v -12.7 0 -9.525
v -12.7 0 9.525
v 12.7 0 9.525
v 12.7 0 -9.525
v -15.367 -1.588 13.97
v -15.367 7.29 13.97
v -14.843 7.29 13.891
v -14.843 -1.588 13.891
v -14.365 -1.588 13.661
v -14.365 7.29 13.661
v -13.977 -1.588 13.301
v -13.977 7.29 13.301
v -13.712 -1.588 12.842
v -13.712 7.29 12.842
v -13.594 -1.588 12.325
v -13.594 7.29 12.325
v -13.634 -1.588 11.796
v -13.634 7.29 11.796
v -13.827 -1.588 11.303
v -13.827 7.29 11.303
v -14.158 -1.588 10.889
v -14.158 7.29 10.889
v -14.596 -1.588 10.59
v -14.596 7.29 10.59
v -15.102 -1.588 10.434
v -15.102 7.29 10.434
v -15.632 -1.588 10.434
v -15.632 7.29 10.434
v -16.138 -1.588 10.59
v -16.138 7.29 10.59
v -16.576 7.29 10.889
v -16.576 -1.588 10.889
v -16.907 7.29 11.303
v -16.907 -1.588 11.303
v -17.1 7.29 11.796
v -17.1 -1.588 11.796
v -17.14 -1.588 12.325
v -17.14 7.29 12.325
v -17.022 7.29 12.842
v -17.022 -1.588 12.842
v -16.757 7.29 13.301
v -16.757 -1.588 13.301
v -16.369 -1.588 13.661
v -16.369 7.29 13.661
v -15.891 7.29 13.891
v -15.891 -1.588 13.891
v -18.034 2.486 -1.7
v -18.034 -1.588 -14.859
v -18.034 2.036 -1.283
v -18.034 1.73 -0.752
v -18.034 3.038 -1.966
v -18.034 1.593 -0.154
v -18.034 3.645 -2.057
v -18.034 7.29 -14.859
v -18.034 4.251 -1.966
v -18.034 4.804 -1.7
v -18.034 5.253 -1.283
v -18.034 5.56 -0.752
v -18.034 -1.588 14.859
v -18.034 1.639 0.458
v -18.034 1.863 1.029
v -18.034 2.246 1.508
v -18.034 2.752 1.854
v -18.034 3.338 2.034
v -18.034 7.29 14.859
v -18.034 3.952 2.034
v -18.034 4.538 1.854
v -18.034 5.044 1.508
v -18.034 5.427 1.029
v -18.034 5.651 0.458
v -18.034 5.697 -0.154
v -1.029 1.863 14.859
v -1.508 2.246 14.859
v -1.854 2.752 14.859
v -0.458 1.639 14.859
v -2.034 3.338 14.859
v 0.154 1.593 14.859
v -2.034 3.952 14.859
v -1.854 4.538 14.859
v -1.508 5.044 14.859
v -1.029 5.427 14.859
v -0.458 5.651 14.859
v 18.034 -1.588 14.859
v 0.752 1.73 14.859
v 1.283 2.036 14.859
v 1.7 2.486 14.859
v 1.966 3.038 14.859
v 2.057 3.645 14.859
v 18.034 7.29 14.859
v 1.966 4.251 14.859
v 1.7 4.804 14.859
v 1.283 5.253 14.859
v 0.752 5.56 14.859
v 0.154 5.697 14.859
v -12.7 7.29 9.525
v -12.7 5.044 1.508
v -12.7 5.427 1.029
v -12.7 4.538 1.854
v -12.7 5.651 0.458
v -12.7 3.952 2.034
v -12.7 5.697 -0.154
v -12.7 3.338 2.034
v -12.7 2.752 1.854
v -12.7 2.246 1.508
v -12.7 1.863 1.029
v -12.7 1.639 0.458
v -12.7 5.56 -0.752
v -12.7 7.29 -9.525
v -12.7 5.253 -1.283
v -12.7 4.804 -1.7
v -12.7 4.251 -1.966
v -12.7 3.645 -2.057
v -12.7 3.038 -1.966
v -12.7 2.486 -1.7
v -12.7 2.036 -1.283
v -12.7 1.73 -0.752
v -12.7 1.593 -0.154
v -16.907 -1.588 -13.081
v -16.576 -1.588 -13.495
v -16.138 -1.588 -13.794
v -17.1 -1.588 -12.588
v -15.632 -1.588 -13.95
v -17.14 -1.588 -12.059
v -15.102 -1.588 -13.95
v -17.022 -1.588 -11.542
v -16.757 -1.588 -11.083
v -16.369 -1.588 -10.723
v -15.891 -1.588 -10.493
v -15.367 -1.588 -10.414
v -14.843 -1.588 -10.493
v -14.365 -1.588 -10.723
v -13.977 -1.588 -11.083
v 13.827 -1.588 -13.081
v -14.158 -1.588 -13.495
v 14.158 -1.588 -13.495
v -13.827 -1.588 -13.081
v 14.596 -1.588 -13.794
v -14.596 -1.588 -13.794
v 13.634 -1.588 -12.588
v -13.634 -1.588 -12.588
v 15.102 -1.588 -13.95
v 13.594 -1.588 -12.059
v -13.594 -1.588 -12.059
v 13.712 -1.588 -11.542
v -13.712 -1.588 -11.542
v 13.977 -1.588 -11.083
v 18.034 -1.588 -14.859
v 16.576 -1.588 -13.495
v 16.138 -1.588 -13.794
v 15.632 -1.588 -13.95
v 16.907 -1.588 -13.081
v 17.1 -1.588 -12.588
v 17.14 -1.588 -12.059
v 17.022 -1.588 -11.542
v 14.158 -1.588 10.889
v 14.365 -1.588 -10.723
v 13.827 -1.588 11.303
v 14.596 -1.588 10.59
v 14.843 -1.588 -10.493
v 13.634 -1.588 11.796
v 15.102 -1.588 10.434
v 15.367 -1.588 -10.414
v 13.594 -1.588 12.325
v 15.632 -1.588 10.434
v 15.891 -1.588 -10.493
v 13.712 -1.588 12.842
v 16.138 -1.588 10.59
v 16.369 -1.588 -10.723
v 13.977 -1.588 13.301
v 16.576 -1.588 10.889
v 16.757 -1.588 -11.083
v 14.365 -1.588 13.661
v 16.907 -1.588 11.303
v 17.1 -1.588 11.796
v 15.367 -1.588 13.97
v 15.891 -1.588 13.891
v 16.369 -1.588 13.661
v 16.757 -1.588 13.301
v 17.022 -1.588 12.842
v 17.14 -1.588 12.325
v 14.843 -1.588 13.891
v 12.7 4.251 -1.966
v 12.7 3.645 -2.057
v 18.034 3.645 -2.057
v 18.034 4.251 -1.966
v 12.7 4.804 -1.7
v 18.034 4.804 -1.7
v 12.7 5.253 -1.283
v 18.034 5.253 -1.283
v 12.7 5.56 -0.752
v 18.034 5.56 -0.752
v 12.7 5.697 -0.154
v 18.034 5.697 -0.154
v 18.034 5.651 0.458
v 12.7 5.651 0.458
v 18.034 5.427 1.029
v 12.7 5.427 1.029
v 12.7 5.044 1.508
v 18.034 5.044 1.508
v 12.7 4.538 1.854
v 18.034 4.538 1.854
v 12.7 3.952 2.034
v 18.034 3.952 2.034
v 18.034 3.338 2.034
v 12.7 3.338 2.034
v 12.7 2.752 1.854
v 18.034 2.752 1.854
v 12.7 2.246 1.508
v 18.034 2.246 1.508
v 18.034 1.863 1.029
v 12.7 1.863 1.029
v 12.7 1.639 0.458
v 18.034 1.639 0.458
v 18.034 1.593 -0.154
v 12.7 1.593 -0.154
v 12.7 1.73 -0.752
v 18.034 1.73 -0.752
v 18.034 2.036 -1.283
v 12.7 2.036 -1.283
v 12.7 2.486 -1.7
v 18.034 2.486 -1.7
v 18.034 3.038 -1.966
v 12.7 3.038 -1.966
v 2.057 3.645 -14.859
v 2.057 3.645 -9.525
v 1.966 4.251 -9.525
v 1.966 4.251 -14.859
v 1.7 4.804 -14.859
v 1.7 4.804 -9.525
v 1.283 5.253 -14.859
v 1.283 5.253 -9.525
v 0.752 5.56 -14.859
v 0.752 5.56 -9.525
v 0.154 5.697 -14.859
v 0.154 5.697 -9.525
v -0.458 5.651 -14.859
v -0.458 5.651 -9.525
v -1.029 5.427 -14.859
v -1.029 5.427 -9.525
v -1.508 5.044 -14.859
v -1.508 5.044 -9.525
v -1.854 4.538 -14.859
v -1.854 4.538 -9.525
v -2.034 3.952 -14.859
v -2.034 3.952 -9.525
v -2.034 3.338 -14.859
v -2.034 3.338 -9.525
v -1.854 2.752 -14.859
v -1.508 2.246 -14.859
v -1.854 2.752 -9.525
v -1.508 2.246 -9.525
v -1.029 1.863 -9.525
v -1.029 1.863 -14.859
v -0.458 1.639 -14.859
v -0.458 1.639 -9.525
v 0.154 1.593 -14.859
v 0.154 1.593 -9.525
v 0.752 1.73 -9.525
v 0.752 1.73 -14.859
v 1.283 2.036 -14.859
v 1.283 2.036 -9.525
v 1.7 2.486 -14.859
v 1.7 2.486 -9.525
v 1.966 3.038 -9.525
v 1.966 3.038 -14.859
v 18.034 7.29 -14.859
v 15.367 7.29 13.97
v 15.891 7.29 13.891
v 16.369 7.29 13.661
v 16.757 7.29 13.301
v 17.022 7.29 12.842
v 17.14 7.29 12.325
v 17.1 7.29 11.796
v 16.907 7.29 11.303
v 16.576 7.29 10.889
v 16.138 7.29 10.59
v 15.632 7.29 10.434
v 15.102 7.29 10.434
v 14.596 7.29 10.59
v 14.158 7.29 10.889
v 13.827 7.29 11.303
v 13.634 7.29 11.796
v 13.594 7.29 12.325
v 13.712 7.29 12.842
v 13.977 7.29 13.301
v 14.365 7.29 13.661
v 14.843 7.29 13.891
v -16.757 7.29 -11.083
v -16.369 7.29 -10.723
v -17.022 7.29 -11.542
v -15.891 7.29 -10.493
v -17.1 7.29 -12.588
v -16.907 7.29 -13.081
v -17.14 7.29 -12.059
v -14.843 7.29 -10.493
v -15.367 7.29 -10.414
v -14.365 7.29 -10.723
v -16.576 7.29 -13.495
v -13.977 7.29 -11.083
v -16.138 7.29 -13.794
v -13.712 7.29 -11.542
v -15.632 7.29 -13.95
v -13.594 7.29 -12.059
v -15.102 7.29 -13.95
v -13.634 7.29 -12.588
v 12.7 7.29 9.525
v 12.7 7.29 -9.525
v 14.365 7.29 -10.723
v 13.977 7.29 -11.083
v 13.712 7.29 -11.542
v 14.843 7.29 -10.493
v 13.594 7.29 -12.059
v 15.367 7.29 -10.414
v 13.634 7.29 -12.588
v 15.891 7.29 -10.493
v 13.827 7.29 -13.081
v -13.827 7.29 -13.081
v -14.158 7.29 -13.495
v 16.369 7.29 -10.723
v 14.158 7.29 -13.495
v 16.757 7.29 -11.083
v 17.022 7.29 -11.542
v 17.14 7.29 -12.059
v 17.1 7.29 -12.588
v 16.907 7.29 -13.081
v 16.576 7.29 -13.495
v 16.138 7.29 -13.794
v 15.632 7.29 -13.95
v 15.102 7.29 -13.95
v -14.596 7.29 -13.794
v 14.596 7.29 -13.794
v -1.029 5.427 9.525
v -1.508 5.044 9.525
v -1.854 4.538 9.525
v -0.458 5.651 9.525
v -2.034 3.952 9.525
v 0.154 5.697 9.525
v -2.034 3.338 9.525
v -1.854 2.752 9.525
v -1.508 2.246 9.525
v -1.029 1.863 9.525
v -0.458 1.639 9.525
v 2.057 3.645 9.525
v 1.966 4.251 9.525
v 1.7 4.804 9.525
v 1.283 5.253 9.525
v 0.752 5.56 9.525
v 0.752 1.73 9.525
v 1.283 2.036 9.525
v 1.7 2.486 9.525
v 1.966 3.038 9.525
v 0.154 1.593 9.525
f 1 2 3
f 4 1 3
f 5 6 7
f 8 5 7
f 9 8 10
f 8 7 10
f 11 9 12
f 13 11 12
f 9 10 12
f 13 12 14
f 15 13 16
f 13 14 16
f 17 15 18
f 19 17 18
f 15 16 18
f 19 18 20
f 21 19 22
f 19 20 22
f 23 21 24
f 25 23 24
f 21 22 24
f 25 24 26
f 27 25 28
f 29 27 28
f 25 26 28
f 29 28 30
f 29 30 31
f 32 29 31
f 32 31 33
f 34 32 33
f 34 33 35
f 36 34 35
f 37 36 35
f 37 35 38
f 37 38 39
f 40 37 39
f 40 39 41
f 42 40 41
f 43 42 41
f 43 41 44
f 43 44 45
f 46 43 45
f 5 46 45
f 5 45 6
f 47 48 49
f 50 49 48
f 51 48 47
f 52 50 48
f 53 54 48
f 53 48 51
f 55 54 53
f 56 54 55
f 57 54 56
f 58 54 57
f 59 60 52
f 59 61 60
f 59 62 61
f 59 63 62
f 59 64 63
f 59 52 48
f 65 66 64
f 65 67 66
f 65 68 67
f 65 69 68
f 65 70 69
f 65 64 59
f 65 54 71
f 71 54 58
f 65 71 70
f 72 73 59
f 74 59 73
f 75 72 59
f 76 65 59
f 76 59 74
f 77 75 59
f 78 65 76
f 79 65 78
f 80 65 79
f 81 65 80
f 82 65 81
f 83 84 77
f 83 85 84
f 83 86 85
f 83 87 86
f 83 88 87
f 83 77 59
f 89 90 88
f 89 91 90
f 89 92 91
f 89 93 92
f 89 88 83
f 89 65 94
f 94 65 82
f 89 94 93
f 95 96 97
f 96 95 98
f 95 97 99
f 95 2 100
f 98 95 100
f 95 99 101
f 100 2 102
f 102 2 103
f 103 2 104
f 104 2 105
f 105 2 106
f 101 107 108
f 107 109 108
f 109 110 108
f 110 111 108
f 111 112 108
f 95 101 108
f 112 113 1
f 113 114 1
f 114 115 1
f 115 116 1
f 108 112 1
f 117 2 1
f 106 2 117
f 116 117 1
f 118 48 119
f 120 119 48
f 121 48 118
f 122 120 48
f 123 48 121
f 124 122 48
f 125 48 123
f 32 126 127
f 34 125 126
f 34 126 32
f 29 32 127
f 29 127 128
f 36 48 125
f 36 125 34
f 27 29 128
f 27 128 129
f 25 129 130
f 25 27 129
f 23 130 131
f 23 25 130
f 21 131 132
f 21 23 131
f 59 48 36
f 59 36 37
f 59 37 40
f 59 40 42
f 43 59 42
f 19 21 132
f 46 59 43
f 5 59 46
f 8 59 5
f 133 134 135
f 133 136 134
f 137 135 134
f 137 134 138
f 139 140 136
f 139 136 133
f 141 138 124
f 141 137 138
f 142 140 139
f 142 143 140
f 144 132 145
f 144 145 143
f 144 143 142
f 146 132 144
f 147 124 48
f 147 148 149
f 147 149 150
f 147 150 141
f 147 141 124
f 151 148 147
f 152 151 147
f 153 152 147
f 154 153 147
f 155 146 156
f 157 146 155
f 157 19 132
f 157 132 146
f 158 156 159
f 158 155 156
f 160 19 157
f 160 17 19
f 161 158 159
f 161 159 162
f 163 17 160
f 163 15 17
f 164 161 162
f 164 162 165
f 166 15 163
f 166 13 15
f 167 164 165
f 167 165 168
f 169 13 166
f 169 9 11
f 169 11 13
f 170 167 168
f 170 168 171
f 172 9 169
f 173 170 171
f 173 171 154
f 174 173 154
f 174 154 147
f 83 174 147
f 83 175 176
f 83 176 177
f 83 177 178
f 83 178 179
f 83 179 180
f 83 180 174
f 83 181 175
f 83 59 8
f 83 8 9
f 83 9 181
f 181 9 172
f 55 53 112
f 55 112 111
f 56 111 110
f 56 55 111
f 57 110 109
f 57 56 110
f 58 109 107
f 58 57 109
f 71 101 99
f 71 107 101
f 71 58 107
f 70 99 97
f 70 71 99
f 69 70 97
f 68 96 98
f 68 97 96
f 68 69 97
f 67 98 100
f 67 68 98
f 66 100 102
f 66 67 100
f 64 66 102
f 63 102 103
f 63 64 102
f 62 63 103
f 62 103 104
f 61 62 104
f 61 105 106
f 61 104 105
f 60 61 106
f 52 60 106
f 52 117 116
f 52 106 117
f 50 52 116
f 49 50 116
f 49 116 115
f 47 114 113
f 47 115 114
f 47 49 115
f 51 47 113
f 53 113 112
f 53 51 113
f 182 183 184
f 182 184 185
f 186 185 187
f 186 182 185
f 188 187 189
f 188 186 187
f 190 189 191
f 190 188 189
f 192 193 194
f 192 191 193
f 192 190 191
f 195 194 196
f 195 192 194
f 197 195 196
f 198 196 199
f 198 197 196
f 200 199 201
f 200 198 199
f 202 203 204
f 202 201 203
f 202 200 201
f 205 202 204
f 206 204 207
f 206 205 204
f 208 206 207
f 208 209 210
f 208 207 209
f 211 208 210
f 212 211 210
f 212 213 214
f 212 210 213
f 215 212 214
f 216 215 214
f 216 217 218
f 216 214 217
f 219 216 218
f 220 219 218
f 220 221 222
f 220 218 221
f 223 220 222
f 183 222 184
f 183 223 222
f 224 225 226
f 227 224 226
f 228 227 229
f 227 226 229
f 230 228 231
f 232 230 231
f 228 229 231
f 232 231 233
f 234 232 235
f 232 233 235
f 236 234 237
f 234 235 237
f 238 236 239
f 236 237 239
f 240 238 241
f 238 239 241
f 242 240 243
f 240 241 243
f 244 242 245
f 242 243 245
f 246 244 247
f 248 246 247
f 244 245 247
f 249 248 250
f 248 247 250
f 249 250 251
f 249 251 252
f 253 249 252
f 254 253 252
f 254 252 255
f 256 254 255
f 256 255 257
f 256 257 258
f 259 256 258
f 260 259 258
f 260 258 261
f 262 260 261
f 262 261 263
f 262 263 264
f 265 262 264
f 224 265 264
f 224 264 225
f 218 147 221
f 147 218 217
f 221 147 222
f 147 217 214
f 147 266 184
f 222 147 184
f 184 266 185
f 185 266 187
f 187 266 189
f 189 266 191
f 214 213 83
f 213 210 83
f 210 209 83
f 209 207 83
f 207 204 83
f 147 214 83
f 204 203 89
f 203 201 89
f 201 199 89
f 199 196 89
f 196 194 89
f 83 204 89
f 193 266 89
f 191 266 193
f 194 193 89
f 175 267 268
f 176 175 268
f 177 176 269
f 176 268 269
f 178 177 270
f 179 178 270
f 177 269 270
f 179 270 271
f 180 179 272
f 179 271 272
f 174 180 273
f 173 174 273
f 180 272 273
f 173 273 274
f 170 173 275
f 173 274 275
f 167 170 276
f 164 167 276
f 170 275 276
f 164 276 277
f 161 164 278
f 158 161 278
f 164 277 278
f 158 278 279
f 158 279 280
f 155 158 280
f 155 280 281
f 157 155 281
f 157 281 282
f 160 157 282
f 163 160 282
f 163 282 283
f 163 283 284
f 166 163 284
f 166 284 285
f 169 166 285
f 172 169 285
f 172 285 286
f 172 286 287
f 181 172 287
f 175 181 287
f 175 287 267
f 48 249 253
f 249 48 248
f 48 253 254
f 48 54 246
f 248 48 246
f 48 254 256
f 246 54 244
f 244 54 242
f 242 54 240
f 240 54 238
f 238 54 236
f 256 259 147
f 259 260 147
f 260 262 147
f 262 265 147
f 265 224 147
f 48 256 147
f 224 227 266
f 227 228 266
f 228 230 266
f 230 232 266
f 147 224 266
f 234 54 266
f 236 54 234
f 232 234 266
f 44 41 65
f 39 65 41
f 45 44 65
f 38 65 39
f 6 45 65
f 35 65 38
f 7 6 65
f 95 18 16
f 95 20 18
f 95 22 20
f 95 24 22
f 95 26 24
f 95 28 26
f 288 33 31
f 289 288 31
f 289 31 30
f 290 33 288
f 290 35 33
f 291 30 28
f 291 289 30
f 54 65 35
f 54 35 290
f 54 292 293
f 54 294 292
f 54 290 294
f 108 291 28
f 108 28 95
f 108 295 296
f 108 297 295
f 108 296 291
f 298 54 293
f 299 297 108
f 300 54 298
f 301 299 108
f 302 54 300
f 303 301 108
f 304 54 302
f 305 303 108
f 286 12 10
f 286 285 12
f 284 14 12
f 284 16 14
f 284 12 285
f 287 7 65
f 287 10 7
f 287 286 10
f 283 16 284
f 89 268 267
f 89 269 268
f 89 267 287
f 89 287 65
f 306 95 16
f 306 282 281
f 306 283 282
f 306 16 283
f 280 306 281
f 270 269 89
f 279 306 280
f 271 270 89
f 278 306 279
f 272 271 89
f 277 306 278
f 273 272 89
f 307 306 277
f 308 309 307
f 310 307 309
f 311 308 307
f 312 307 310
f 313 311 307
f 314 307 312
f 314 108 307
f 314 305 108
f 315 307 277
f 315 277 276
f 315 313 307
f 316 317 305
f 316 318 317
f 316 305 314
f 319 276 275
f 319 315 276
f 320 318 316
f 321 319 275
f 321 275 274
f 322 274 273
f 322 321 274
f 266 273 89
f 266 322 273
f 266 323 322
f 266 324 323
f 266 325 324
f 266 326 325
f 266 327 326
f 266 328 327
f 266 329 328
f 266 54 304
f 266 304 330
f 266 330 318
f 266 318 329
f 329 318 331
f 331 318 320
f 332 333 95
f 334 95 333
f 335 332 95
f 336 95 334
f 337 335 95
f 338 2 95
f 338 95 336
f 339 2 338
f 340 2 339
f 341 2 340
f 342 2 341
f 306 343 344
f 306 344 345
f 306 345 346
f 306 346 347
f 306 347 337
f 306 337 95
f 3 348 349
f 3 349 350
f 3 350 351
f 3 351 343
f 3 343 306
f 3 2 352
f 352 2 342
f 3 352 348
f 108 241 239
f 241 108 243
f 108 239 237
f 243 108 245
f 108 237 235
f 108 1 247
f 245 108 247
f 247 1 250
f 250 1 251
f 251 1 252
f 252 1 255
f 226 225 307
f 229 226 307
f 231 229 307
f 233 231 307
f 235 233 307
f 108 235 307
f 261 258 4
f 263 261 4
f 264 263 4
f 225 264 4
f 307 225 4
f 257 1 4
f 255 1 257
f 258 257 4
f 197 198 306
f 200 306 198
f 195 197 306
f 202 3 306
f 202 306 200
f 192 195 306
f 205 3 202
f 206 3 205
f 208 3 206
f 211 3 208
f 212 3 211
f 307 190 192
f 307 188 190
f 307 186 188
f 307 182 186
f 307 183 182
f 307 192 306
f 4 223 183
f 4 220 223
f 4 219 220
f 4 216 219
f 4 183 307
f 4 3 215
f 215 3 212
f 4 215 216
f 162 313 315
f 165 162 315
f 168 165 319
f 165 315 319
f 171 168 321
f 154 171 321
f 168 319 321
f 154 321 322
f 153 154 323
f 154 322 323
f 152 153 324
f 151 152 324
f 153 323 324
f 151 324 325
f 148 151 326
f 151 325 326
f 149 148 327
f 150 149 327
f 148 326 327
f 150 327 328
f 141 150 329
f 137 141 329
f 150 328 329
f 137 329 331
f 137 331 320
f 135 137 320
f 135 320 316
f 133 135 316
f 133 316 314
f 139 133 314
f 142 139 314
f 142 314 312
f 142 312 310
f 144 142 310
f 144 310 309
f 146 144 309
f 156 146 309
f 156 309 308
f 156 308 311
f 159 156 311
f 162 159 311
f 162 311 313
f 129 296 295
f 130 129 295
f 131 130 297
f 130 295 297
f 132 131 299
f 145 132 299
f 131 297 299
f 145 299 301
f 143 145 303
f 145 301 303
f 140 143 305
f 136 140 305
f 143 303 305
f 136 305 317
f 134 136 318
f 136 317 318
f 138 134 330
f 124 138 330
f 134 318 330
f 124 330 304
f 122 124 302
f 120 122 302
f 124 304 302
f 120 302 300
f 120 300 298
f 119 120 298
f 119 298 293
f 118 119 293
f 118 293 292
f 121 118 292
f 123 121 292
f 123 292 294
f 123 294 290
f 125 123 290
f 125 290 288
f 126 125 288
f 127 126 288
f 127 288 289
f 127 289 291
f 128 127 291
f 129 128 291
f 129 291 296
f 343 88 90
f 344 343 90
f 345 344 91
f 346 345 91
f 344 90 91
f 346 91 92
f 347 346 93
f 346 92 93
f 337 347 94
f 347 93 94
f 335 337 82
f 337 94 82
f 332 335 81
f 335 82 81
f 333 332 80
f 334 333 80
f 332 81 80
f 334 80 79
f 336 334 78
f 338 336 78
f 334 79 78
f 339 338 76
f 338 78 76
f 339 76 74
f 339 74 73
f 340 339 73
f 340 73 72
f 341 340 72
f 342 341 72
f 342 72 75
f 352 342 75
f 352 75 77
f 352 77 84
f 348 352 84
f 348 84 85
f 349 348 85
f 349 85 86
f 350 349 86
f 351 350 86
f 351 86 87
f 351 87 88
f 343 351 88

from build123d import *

# Parameters (mm, degrees)
SKETCH1_W               = 36.068
SKETCH1_H               = 29.718
SKETCH1_W_2             = 25.4
SKETCH1_H_2             = 19.05
BOSS_EXTRUDE3_DEPTH     = 7.2898
SKETCH4_W               = 36.068
SKETCH4_H               = 29.718
BOSS_EXTRUDE4_DEPTH     = 1.5875
SKETCH5_R               = 1.778
CUT_EXTRUDE2_DEPTH      = 9.525
CUT_EXTRUDE3_DEPTH      = 40.684149091
CUT_EXTRUDE3_DEPTH_BACK = 40.684149091
SKETCH6_R               = 2.0574
SKETCH7_R               = 2.0574
CUT_EXTRUDE4_DEPTH      = 36.51796537


with BuildPart() as part:
    # Sketch1 → Boss-Extrude3 (new body)
    with BuildSketch(Plane(origin=(0, 0, 0), x_dir=(1, 0, 0), z_dir=(0, 1, 0))):
        Rectangle(SKETCH1_W, SKETCH1_H)
        Rectangle(SKETCH1_W_2, SKETCH1_H_2, mode=Mode.SUBTRACT)
    extrude(amount=BOSS_EXTRUDE3_DEPTH)

    # Sketch4 → Boss-Extrude4 (add)
    with BuildSketch(Plane.XZ):
        Rectangle(SKETCH4_W, SKETCH4_H)
    extrude(amount=BOSS_EXTRUDE4_DEPTH)

    # Sketch5 → Cut-Extrude2 (cut)
    with BuildSketch(Plane(origin=(0, 7.2898, 0), x_dir=(1, 0, 0), z_dir=(0, 1, 0))):
        with Locations(Location((-15.367, 12.192, 0), (0, 0, 270))):
            Circle(SKETCH5_R)
        with Locations(Location((15.367, 12.192, 0), (0, 0, 270))):
            Circle(SKETCH5_R)
        with Locations(Location((15.367, -12.192, 0), (0, 0, 270))):
            Circle(SKETCH5_R)
        with Locations(Location((-15.367, -12.192, 0), (0, 0, 270))):
            Circle(SKETCH5_R)
    extrude(amount=-CUT_EXTRUDE2_DEPTH, mode=Mode.SUBTRACT)

    # Sketch6 → Cut-Extrude3 (cut, two sides: drawn at the far end of the back side and taken through both)
    with BuildSketch(Plane(origin=(18.034, 0, 0), x_dir=(0, 0, -1), z_dir=(1, 0, 0)).offset(-CUT_EXTRUDE3_DEPTH_BACK)):
        with Locations((0, 3.6449)):
            Circle(SKETCH6_R)
    extrude(amount=CUT_EXTRUDE3_DEPTH + CUT_EXTRUDE3_DEPTH_BACK, mode=Mode.SUBTRACT)

    # Sketch7 → Cut-Extrude4 (cut, through all)
    with BuildSketch(Plane.XY.offset(14.859)):
        with Locations((0, 3.6449)):
            Circle(SKETCH7_R)
    extrude(amount=-CUT_EXTRUDE4_DEPTH, mode=Mode.SUBTRACT)


solid = part.part
